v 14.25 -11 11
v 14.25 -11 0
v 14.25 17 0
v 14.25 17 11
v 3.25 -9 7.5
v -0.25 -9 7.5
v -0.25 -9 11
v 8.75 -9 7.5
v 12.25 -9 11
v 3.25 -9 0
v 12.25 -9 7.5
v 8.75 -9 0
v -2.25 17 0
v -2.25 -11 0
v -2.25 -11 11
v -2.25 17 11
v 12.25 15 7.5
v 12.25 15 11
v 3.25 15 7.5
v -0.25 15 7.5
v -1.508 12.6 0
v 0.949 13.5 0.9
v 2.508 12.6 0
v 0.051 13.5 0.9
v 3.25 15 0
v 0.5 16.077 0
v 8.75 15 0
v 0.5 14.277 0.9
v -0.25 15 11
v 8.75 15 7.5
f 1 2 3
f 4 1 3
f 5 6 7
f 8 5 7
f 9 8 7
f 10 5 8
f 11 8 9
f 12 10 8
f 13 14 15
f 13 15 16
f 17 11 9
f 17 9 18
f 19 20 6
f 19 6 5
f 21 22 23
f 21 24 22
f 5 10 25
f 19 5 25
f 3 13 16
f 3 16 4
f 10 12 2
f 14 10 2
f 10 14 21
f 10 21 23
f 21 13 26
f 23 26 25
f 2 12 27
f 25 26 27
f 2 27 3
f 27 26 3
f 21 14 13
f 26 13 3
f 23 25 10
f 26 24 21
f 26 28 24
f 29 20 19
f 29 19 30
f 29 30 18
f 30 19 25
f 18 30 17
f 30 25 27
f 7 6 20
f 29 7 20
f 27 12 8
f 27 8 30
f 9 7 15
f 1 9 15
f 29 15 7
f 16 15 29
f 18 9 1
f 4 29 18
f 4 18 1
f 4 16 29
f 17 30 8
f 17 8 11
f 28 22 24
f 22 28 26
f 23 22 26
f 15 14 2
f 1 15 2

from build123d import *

# Parameters (mm, degrees)
BOX014_W                   = 5.5
BOX014_H                   = 24
BOX014_DEPTH               = 8
BOX016_W                   = 12.5
BOX016_H                   = 24
BOX016_DEPTH               = 4
PAD009_DEPTH               = 1.1
CHAMFER001_SIZE            = 1
CHAMFER001_PLACEMENT_ANGLE = 180
BOX015_W                   = 16.5
BOX015_H                   = 28
BOX015_DEPTH               = 11


with BuildPart() as cube014:
    # Box014 → Box014 (new body)
    with BuildSketch(Plane(origin=(3.25, -9, -0.5), x_dir=(1, 0, 0), z_dir=(0, 0, 1))):
        with Locations((2.75, 12)):
            Rectangle(BOX014_W, BOX014_H)
    extrude(amount=BOX014_DEPTH)


with BuildPart() as cube016:
    # Box016 → Box016 (new body)
    with BuildSketch(Plane(origin=(-0.25, -9, 7.5), x_dir=(1, 0, 0), z_dir=(0, 0, 1))):
        with Locations((6.25, 12)):
            Rectangle(BOX016_W, BOX016_H)
    extrude(amount=BOX016_DEPTH)


with BuildPart() as fusion010:
    # Sketch012 → Pad009 (new body)
    with BuildSketch(Plane.XY):
        Polygon((0, 20.777284), (-2.180816, 17), (2.180816, 17), align=None)
    extrude(amount=PAD009_DEPTH)

    # Chamfer001
    chamfer001_edges = [fusion010.edges().sort_by_distance(p)[0] for p in [
        (-1.090408, 18.888642, 0),
        (0, 17, 0),
        (1.090408, 18.888642, 0),
    ]]
    chamfer(chamfer001_edges, length=CHAMFER001_SIZE)


with BuildPart() as fusion010_1:
    # Chamfer001 placement: moved
    add(fusion010.part.moved(Location((0.5, -4.5, 0.9))).rotate(Axis((0.5, -4.5, 0.9), (0, 1, 0)), CHAMFER001_PLACEMENT_ANGLE))

    # Fusion010: union Cube014, Cube016
    add(cube014.part)
    add(cube016.part)


with BuildPart() as tracklightconninner:
    # Box015 → Box015 (new body)
    with BuildSketch(Plane(origin=(-2.25, -11, 0), x_dir=(1, 0, 0), z_dir=(0, 0, 1))):
        with Locations((8.25, 14)):
            Rectangle(BOX015_W, BOX015_H)
    extrude(amount=BOX015_DEPTH)

    # Cut021: cut Fusion010
    add(fusion010_1.part, mode=Mode.SUBTRACT)


solid = tracklightconninner.part
